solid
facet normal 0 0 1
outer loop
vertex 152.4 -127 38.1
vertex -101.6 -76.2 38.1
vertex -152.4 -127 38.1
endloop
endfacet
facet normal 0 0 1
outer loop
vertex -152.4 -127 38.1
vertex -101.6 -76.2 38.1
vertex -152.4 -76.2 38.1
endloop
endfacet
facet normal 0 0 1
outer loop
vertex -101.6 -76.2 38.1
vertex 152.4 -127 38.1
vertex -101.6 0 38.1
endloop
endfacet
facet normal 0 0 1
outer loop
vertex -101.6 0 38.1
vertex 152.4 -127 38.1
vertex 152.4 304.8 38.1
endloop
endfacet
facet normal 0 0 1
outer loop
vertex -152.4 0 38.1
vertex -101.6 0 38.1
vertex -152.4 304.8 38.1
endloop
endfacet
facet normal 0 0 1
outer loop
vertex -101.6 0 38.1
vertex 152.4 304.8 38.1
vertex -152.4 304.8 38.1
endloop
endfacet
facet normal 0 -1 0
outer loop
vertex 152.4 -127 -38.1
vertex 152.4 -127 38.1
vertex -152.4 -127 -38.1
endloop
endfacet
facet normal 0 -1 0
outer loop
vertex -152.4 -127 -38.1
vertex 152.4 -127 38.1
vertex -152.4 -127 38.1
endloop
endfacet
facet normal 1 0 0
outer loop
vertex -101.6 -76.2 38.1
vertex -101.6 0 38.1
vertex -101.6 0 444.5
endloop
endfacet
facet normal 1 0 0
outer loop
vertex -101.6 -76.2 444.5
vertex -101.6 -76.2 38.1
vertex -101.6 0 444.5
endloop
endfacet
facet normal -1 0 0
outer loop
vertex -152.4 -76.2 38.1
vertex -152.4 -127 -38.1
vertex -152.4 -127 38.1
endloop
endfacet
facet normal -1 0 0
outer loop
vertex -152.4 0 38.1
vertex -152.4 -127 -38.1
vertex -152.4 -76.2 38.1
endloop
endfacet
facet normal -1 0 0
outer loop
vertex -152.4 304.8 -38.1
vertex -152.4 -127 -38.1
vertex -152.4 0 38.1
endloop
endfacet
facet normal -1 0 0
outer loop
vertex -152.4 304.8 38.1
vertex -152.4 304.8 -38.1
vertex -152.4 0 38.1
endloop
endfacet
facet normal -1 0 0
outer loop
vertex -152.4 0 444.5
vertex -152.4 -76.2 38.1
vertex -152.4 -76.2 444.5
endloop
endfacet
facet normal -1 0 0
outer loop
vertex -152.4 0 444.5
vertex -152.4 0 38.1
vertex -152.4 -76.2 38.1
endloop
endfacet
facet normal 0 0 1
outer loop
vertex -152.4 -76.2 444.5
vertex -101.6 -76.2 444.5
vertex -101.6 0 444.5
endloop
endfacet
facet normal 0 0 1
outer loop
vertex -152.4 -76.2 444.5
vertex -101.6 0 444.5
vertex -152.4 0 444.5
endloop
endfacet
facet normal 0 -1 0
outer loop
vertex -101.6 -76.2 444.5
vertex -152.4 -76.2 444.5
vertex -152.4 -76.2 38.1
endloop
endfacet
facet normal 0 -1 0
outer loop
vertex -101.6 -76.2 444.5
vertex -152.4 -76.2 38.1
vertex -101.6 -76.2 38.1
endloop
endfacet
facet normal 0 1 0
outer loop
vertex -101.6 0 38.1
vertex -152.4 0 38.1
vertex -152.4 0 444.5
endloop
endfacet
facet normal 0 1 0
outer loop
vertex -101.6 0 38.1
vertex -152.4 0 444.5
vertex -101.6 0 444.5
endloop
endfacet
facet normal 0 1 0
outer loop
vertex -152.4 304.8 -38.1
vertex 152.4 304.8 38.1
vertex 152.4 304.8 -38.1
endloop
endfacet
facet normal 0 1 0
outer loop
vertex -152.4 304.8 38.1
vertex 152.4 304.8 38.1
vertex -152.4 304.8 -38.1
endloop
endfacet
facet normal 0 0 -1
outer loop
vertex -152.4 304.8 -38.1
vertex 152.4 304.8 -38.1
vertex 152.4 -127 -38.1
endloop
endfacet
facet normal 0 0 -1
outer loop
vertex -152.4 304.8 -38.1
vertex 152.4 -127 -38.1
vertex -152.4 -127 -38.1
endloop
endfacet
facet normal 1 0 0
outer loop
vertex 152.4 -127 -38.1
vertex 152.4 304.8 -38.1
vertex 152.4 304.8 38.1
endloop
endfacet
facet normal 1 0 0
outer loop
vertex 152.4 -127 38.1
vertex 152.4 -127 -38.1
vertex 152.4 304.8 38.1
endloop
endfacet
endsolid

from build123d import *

# Parameters (mm, degrees)
F1_DEPTH      = 76.2
F2_W          = 304.8
F2_H          = 76.2
F3_DEPTH      = 304.8
F3_DEPTH_BACK = 127


with BuildPart() as f1:
    # F0 (on Front) → F1 (new body)
    with BuildSketch(Plane.XZ):
        Polygon((-152.4, 38.1), (-152.4, -38.1), (152.4, -38.1), (152.4, 38.1), (-101.6, 38.1), (-101.6, 444.5), (-152.4, 444.5), align=None)
    extrude(amount=F1_DEPTH)

    # F2 (on face) → F3 (join, two sides)
    with BuildSketch(Plane(origin=(0, 0, 0), x_dir=(-1, 0, 0), z_dir=(0, 1, 0))) as f3_sk:
        Rectangle(F2_W, F2_H)
    extrude(amount=F3_DEPTH)
    extrude(f3_sk.sketch, amount=-F3_DEPTH_BACK)


solid = f1.part
